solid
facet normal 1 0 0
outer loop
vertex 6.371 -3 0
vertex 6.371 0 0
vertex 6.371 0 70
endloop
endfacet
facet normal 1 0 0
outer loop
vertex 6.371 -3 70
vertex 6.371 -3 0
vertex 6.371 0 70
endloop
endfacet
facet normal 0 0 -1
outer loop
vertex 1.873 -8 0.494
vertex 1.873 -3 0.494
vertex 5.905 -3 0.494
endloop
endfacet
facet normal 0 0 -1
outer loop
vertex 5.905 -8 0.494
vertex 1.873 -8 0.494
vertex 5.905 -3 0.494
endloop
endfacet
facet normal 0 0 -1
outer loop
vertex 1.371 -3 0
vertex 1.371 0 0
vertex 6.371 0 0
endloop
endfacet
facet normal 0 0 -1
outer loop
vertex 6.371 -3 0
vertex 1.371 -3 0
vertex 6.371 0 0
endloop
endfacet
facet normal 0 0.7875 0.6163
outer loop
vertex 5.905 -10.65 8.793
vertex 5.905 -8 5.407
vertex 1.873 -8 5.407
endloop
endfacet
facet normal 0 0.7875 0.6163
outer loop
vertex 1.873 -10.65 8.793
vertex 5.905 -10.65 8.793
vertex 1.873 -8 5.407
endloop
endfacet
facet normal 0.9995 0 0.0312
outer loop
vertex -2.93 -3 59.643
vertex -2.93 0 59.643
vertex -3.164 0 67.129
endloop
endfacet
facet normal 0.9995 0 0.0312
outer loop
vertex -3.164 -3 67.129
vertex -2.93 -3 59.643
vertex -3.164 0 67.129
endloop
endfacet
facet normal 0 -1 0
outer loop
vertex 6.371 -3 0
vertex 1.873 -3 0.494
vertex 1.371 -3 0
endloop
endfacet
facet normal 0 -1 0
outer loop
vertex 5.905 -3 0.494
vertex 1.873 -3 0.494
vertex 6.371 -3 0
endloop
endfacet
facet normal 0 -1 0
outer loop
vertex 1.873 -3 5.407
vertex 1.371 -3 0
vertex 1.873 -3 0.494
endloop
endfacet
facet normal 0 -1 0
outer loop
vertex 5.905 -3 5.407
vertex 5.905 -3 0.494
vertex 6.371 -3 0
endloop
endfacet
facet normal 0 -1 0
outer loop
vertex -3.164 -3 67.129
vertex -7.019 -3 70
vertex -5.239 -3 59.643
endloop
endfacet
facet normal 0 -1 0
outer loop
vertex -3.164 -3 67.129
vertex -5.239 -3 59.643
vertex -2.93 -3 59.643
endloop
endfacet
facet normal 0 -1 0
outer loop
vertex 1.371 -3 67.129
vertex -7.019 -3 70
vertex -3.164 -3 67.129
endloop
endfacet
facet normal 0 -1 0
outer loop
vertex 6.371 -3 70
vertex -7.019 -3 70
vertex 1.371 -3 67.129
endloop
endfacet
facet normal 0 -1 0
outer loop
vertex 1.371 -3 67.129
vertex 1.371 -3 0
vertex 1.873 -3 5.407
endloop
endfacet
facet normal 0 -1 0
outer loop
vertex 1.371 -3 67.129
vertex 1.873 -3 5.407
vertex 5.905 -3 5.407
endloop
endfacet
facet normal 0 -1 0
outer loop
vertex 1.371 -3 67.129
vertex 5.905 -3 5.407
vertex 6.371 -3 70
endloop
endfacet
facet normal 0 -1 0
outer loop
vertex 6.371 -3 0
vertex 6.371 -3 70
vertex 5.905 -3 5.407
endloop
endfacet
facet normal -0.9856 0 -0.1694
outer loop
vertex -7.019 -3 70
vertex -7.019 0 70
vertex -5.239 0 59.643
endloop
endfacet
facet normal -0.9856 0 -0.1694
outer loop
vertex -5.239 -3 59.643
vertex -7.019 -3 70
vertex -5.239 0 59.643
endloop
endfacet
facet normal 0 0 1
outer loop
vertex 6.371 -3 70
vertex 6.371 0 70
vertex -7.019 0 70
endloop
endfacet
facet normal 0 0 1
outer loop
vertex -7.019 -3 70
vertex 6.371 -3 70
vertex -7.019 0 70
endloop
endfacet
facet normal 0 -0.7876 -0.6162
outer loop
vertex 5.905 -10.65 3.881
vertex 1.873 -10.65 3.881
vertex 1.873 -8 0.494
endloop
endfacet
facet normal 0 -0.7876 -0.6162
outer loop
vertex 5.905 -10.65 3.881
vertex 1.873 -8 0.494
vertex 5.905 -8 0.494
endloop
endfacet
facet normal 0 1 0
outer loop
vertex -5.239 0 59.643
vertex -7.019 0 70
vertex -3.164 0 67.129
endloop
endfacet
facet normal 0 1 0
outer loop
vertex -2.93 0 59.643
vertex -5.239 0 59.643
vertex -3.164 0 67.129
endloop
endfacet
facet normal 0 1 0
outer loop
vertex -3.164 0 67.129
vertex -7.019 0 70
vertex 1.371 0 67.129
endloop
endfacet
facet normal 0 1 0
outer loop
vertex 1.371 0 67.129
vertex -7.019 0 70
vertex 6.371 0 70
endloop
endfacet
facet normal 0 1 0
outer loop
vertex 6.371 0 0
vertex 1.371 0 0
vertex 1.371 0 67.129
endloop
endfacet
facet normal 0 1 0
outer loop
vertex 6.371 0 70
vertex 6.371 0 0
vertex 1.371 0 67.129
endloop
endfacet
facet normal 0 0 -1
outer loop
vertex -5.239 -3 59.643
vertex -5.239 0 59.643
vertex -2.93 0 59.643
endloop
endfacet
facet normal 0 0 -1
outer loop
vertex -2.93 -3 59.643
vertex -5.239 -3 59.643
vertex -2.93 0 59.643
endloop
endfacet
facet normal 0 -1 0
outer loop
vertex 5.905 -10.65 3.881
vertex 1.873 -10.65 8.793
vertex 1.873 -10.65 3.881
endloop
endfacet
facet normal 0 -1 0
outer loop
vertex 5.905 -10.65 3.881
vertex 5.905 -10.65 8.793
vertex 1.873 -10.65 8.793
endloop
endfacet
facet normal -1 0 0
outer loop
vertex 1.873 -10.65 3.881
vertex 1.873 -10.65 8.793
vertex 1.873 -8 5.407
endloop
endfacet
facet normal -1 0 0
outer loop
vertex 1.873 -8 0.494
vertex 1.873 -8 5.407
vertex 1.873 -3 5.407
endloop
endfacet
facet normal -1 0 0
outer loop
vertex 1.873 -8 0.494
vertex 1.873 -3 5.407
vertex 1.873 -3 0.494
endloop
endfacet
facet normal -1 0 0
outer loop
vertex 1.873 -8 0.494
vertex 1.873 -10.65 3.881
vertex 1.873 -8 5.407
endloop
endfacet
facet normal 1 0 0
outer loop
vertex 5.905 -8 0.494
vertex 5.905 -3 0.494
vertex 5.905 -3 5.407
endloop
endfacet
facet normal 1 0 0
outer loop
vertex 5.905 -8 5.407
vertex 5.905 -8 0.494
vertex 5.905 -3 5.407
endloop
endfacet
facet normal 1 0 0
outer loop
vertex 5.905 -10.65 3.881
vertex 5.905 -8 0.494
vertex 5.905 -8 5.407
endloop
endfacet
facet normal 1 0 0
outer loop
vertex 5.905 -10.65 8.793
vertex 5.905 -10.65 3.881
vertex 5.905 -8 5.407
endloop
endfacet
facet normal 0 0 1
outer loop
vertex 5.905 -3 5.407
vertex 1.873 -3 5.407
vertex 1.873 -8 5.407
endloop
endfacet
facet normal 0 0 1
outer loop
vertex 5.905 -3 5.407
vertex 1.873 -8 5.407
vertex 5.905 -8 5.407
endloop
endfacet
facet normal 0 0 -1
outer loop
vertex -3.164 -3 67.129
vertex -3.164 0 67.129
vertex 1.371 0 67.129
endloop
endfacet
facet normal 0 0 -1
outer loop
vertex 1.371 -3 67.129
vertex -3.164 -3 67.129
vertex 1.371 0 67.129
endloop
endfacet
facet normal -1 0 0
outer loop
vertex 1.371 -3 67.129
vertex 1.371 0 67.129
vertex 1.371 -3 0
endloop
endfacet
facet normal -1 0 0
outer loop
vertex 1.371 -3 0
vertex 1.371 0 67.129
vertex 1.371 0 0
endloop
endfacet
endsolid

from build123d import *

# Parameters (mm, degrees)
F1_DEPTH = 3
F2_W     = 4.032329
F2_H     = 4.912953
F3_DEPTH = 5
F4_W     = 4.032329
F4_H     = 4.912953


with BuildPart() as f1:
    # F0 (on Front) → F1 (new body)
    with BuildSketch(Plane.XZ):
        Polygon((1.371463, 67.128956), (1.371463, 0), (6.371463, 0), (6.371463, 70), (1.371463, 70), (-7.018532, 70), (-5.238707, 59.643164), (-2.930099, 59.643164), (-3.16445, 67.128956), align=None)
    extrude(amount=F1_DEPTH)

    # F2 (on face) → F3 (join)
    with BuildSketch(Plane.XZ.offset(3)):
        with Locations((3.889312, 2.950882)):
            Rectangle(F2_W, F2_H)
    extrude(amount=F3_DEPTH)

    # F6: sweep along a path in F5
    with BuildLine(Plane.YZ.offset(5.905477)) as f6_path:
        Line((-8, 5.407359), (-10.649814, 8.793468))
    # F4 (on face) → F6 (sweep)
    with BuildSketch(Plane.XZ.offset(8)):
        with Locations((3.889312, 2.950882)):
            Rectangle(F4_W, F4_H)
    sweep(path=f6_path.line)


solid = f1.part
